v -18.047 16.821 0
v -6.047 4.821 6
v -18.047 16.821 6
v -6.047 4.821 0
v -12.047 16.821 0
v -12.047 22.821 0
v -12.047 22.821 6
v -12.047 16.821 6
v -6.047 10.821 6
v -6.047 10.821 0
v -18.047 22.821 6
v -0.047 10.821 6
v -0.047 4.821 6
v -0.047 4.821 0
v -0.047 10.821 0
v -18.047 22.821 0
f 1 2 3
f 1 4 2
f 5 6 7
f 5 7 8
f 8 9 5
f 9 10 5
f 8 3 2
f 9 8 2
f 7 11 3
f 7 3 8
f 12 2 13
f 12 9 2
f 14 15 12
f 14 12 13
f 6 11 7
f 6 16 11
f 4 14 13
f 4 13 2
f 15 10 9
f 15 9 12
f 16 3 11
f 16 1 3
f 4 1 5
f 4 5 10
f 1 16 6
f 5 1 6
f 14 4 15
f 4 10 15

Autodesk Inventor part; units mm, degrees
ref_plane "YZ Plane" through (0, 0, 0) normal (1, 0, 0) x (0, 1, 0)
ref_plane "XZ Plane" through (0, 0, 0) normal (0, 1, 0) x (-1, 0, 0)
ref_plane "XY Plane" through (0, 0, 0) normal (0, 0, 1) x (1, 0, 0)
sketch "Sketch1" plane through (0, 0, 0) normal (0, 0, 1) x (1, 0, 0)
  line L0 (-0.0466, 4.8213) -> (-6.0466, 4.8213)
  line L1 (-6.0466, 4.8213) -> (-6.0466, 10.8213)
  line L2 (-6.0466, 10.8213) -> (-0.0466, 10.8213)
  line L3 (-0.0466, 10.8213) -> (-0.0466, 4.8213)
  line L4 (-12.0466, 16.8213) -> (-18.0466, 16.8213)
  line L5 (-18.0466, 16.8213) -> (-18.0466, 22.8213)
  line L6 (-18.0466, 22.8213) -> (-12.0466, 22.8213)
  line L7 (-12.0466, 22.8213) -> (-12.0466, 16.8213)
  line L8 (-6.0466, 10.8213) -> (-12.0466, 16.8213)
  line L9 (-6.0466, 4.8213) -> (-18.0466, 16.8213)
  point P0 (0, 0)
  dimension "d0" = 6
  dimension "d1" = 6
  dimension "d4" = 6
  dimension "d5" = 6
  dimension "d6" = 45
  dimension "d7" = 6
extrude "Extrusion1" add sketch "Sketch1" along normal blind 6
properties part number "TriangleConnector"
